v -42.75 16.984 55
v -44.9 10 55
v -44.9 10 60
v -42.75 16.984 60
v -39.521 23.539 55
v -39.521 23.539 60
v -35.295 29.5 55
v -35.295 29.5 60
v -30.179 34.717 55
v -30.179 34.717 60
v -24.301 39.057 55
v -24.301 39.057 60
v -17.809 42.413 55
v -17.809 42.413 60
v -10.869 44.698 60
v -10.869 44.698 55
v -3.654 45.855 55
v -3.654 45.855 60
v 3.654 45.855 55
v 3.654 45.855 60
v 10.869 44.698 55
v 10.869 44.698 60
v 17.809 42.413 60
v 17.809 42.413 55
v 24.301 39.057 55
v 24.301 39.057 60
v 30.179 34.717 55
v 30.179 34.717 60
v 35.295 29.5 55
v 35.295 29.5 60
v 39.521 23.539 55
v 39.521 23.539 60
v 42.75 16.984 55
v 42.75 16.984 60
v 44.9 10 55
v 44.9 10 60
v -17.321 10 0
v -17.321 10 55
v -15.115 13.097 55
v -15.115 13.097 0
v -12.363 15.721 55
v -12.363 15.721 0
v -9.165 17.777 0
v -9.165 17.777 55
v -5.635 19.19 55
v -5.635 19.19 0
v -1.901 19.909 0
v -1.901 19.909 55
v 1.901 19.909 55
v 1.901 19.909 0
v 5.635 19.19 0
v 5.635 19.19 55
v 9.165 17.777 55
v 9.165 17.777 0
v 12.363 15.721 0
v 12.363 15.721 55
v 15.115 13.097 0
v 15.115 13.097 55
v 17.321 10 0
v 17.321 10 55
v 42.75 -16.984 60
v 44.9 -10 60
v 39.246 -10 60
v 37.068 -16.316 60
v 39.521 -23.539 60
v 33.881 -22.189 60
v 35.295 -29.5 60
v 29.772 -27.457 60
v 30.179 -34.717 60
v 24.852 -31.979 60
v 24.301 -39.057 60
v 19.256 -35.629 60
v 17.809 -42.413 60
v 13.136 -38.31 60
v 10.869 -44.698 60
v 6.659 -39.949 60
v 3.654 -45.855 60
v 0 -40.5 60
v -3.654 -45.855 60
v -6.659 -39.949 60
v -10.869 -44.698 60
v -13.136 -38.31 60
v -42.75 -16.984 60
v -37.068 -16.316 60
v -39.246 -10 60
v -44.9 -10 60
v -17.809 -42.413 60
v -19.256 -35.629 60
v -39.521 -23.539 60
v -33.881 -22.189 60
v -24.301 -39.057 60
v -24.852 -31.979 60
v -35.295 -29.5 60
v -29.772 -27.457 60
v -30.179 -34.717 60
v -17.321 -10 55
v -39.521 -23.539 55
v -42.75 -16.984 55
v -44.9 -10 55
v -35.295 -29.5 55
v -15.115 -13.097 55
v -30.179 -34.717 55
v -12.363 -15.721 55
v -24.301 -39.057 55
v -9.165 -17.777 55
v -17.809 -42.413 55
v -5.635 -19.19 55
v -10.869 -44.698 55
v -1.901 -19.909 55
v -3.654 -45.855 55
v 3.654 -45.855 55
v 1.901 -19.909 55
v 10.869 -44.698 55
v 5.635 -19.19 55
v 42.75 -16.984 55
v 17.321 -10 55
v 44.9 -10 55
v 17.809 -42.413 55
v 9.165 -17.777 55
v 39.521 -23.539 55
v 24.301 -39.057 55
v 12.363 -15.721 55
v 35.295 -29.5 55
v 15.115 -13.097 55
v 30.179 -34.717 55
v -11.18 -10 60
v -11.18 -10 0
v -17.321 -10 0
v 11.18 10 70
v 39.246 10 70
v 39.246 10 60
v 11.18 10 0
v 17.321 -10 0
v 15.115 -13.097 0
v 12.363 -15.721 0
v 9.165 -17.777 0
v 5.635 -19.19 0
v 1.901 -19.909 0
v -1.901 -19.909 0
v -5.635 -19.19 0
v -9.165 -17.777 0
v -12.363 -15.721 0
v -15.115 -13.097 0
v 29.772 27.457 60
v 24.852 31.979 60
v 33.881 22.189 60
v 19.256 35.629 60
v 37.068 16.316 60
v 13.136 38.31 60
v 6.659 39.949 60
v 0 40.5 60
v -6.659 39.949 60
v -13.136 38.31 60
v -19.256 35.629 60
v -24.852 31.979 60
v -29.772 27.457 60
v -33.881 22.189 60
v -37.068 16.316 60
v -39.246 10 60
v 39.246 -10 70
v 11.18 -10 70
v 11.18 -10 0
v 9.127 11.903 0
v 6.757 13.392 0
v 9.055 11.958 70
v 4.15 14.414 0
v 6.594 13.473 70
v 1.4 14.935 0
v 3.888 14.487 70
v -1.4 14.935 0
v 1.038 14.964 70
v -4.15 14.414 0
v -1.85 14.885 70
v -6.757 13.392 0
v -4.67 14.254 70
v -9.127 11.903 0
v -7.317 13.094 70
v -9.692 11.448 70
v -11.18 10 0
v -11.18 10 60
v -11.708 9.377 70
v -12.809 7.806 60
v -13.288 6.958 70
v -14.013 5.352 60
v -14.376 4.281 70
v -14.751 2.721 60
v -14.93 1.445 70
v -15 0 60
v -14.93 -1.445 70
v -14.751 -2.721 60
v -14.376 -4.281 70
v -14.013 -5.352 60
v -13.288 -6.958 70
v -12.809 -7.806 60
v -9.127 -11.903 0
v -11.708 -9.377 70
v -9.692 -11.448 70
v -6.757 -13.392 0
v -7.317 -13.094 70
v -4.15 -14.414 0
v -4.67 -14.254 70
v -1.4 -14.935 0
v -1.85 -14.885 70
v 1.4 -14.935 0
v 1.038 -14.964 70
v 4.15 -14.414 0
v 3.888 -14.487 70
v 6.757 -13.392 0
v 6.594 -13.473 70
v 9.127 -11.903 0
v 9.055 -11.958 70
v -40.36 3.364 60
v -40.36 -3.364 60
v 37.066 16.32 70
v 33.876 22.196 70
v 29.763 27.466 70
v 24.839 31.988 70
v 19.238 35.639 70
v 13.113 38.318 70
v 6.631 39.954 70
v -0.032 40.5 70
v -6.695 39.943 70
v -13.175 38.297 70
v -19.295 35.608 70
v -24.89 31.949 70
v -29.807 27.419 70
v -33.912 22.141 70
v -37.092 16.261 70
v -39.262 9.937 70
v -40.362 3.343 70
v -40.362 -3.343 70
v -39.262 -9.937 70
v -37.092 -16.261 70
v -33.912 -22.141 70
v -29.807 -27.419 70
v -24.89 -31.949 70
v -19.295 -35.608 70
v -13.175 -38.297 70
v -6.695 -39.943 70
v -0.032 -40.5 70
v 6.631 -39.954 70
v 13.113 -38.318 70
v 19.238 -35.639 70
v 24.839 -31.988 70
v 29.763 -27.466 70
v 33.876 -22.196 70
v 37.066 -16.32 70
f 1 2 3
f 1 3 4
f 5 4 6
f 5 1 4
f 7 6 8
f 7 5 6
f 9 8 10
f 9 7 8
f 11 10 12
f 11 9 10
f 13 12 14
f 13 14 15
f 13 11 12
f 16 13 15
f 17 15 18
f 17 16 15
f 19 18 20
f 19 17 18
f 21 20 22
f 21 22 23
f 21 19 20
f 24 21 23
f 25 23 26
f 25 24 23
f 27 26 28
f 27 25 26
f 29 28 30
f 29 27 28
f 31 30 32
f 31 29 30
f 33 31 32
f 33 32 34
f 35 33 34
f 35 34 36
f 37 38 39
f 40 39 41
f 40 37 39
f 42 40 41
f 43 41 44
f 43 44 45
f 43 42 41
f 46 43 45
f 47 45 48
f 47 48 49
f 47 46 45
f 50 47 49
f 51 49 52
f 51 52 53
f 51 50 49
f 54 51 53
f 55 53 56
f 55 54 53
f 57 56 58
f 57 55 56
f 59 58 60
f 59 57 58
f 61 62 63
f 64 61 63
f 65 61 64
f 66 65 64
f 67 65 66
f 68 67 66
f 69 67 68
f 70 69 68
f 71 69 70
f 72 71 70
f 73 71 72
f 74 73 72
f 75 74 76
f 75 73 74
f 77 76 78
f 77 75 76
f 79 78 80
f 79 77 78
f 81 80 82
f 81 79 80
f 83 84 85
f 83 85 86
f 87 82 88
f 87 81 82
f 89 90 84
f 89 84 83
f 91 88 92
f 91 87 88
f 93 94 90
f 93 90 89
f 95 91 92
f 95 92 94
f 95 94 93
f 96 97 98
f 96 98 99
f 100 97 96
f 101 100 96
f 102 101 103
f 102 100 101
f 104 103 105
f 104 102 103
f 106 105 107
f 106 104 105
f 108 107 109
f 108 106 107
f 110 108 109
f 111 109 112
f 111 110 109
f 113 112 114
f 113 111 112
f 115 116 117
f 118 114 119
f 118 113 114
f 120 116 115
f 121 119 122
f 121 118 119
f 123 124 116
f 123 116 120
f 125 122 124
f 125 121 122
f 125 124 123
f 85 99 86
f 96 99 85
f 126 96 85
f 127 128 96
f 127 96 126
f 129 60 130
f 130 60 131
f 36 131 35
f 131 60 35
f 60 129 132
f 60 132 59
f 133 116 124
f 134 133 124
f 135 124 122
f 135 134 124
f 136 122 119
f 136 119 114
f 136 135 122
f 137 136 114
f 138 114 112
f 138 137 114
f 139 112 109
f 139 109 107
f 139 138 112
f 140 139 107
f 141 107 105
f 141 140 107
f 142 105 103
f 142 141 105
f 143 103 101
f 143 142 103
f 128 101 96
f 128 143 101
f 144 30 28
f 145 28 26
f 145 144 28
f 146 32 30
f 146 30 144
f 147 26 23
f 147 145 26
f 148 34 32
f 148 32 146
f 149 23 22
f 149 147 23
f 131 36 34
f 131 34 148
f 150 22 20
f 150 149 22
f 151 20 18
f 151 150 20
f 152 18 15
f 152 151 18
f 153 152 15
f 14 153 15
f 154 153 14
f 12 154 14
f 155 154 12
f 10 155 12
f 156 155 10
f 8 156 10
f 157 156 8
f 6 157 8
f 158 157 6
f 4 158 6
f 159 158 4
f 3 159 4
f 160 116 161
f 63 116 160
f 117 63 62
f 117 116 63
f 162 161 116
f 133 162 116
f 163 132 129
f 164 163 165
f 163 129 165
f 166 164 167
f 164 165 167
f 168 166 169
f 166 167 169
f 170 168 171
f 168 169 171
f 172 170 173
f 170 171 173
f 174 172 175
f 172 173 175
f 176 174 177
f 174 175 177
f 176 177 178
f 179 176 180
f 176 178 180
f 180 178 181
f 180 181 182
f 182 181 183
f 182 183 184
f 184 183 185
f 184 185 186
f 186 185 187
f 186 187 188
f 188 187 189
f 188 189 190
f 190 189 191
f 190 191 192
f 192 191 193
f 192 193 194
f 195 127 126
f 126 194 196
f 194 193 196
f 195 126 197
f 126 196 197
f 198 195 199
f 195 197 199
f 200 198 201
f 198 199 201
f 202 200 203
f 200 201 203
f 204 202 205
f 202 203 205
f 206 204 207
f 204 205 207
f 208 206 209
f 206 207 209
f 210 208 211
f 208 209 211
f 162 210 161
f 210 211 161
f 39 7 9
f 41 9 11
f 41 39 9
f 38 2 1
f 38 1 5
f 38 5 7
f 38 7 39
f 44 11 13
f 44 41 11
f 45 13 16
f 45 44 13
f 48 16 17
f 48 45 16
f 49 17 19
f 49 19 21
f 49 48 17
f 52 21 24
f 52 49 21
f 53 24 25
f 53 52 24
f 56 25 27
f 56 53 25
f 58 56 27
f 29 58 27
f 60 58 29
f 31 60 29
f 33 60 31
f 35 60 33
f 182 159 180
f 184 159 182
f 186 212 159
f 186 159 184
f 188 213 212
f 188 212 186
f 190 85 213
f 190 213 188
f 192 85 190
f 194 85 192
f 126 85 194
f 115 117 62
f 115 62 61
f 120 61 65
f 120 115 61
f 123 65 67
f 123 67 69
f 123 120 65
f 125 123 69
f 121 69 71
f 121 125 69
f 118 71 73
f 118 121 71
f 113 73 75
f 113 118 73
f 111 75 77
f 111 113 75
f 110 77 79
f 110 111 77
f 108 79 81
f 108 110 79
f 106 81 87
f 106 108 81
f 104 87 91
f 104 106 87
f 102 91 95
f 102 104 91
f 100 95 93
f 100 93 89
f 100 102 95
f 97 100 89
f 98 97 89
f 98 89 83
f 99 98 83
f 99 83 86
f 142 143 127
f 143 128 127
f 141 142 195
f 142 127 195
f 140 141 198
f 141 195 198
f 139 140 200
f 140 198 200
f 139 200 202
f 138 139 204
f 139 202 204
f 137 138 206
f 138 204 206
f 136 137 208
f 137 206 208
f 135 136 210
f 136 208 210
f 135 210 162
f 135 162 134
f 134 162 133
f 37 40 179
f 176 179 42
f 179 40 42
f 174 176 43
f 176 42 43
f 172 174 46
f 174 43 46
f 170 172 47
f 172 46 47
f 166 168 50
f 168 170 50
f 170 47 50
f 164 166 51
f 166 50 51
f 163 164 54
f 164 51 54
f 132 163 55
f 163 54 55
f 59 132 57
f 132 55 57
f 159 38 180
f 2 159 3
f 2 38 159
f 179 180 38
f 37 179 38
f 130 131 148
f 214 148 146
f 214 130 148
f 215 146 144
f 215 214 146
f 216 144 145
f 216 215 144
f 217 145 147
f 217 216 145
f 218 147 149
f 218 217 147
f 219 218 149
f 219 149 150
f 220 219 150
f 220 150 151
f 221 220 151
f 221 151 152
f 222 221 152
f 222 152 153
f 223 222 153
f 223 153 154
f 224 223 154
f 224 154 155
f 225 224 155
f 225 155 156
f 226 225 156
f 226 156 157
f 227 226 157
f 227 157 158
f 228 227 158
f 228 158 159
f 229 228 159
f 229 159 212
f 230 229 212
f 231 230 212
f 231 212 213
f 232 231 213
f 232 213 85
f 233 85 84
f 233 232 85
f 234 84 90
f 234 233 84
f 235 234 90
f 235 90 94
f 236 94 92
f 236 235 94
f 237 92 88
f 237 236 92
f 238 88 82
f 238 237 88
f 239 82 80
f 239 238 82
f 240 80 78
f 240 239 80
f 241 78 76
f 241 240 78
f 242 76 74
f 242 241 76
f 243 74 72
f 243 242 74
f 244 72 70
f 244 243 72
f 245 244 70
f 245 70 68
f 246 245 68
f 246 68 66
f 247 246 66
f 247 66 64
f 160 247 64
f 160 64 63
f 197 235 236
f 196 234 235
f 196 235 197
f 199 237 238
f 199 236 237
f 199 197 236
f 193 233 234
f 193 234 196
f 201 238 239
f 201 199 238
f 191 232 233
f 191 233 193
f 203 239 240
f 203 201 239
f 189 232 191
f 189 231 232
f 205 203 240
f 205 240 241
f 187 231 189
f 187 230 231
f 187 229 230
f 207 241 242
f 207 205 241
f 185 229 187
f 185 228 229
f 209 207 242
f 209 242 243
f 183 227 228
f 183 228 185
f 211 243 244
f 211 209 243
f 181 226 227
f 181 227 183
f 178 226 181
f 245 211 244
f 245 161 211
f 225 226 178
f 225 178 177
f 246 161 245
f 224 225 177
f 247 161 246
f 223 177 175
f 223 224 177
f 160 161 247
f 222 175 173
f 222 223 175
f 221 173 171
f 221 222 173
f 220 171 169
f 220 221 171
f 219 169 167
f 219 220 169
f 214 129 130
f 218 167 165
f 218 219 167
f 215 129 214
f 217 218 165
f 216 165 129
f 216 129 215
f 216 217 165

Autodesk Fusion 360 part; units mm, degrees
sketch "スケッチ1" plane through (0, 0, 0) normal (0, 0, 1) x (1, 0, 0)
  circle A0 centre (0, 0) radius 46
  dimension "d1" = 92
extrude "押し出し1" add sketch "スケッチ1" along normal blind 70
sketch "スケッチ2" plane through (0, 0, 70) normal (0, 0, 1) x (-1, 0, 0)
  circle A0 centre (0, 0) radius 46
  circle A1 centre (0, 0) radius 40.5
  dimension "d4" = 81
extrude "押し出し2" cut sketch "スケッチ2" against normal blind 10
sketch "スケッチ3" plane through (0, 0, 70) normal (0, 0, 1) x (-1, 0, 0)
  circle A0 centre (0, 0) radius 40.5
  circle A1 centre (0, 0) radius 15
  dimension "d7" = 30
extrude "押し出し3" cut sketch "スケッチ3" against normal blind 100 contours A1
sketch "スケッチ4" plane through (0, 0, 0) normal (0, 0, -1) x (1, 0, 0)
  circle A0 centre (0, 0) radius 15
  circle A1 centre (0, 0) radius 46
  circle A2 centre (0, 0) radius 20
  dimension "d12" = 40
extrude "押し出し4" cut sketch "スケッチ4" against normal blind 55 contours A1
sketch "スケッチ5" plane through (0, 0, 0) normal (0, 0, -1) x (1, 0, 0)
  circle A0 centre (0, 0) radius 20
  circle A1 centre (0, 0) radius 15
  line L0 (-55, 10) -> (55, 10)
  line L1 (55, 10) -> (55, -10)
  line L2 (55, -10) -> (-55, -10)
  line L3 (-55, -10) -> (-55, 10)
extrude "押し出し5" cut sketch "スケッチ5" against normal blind 60 contours A0 A1 L0 L2 | A0 L0 L1 L2 | A0 A1 L0 L2 | A0 L0 L2 L3
extrude "押し出し6" cut 1 faces at (31.4239, 5.7402, 60) along direction (0, 0, 1) blind 10
fillet "フィレット1" [suppressed]
